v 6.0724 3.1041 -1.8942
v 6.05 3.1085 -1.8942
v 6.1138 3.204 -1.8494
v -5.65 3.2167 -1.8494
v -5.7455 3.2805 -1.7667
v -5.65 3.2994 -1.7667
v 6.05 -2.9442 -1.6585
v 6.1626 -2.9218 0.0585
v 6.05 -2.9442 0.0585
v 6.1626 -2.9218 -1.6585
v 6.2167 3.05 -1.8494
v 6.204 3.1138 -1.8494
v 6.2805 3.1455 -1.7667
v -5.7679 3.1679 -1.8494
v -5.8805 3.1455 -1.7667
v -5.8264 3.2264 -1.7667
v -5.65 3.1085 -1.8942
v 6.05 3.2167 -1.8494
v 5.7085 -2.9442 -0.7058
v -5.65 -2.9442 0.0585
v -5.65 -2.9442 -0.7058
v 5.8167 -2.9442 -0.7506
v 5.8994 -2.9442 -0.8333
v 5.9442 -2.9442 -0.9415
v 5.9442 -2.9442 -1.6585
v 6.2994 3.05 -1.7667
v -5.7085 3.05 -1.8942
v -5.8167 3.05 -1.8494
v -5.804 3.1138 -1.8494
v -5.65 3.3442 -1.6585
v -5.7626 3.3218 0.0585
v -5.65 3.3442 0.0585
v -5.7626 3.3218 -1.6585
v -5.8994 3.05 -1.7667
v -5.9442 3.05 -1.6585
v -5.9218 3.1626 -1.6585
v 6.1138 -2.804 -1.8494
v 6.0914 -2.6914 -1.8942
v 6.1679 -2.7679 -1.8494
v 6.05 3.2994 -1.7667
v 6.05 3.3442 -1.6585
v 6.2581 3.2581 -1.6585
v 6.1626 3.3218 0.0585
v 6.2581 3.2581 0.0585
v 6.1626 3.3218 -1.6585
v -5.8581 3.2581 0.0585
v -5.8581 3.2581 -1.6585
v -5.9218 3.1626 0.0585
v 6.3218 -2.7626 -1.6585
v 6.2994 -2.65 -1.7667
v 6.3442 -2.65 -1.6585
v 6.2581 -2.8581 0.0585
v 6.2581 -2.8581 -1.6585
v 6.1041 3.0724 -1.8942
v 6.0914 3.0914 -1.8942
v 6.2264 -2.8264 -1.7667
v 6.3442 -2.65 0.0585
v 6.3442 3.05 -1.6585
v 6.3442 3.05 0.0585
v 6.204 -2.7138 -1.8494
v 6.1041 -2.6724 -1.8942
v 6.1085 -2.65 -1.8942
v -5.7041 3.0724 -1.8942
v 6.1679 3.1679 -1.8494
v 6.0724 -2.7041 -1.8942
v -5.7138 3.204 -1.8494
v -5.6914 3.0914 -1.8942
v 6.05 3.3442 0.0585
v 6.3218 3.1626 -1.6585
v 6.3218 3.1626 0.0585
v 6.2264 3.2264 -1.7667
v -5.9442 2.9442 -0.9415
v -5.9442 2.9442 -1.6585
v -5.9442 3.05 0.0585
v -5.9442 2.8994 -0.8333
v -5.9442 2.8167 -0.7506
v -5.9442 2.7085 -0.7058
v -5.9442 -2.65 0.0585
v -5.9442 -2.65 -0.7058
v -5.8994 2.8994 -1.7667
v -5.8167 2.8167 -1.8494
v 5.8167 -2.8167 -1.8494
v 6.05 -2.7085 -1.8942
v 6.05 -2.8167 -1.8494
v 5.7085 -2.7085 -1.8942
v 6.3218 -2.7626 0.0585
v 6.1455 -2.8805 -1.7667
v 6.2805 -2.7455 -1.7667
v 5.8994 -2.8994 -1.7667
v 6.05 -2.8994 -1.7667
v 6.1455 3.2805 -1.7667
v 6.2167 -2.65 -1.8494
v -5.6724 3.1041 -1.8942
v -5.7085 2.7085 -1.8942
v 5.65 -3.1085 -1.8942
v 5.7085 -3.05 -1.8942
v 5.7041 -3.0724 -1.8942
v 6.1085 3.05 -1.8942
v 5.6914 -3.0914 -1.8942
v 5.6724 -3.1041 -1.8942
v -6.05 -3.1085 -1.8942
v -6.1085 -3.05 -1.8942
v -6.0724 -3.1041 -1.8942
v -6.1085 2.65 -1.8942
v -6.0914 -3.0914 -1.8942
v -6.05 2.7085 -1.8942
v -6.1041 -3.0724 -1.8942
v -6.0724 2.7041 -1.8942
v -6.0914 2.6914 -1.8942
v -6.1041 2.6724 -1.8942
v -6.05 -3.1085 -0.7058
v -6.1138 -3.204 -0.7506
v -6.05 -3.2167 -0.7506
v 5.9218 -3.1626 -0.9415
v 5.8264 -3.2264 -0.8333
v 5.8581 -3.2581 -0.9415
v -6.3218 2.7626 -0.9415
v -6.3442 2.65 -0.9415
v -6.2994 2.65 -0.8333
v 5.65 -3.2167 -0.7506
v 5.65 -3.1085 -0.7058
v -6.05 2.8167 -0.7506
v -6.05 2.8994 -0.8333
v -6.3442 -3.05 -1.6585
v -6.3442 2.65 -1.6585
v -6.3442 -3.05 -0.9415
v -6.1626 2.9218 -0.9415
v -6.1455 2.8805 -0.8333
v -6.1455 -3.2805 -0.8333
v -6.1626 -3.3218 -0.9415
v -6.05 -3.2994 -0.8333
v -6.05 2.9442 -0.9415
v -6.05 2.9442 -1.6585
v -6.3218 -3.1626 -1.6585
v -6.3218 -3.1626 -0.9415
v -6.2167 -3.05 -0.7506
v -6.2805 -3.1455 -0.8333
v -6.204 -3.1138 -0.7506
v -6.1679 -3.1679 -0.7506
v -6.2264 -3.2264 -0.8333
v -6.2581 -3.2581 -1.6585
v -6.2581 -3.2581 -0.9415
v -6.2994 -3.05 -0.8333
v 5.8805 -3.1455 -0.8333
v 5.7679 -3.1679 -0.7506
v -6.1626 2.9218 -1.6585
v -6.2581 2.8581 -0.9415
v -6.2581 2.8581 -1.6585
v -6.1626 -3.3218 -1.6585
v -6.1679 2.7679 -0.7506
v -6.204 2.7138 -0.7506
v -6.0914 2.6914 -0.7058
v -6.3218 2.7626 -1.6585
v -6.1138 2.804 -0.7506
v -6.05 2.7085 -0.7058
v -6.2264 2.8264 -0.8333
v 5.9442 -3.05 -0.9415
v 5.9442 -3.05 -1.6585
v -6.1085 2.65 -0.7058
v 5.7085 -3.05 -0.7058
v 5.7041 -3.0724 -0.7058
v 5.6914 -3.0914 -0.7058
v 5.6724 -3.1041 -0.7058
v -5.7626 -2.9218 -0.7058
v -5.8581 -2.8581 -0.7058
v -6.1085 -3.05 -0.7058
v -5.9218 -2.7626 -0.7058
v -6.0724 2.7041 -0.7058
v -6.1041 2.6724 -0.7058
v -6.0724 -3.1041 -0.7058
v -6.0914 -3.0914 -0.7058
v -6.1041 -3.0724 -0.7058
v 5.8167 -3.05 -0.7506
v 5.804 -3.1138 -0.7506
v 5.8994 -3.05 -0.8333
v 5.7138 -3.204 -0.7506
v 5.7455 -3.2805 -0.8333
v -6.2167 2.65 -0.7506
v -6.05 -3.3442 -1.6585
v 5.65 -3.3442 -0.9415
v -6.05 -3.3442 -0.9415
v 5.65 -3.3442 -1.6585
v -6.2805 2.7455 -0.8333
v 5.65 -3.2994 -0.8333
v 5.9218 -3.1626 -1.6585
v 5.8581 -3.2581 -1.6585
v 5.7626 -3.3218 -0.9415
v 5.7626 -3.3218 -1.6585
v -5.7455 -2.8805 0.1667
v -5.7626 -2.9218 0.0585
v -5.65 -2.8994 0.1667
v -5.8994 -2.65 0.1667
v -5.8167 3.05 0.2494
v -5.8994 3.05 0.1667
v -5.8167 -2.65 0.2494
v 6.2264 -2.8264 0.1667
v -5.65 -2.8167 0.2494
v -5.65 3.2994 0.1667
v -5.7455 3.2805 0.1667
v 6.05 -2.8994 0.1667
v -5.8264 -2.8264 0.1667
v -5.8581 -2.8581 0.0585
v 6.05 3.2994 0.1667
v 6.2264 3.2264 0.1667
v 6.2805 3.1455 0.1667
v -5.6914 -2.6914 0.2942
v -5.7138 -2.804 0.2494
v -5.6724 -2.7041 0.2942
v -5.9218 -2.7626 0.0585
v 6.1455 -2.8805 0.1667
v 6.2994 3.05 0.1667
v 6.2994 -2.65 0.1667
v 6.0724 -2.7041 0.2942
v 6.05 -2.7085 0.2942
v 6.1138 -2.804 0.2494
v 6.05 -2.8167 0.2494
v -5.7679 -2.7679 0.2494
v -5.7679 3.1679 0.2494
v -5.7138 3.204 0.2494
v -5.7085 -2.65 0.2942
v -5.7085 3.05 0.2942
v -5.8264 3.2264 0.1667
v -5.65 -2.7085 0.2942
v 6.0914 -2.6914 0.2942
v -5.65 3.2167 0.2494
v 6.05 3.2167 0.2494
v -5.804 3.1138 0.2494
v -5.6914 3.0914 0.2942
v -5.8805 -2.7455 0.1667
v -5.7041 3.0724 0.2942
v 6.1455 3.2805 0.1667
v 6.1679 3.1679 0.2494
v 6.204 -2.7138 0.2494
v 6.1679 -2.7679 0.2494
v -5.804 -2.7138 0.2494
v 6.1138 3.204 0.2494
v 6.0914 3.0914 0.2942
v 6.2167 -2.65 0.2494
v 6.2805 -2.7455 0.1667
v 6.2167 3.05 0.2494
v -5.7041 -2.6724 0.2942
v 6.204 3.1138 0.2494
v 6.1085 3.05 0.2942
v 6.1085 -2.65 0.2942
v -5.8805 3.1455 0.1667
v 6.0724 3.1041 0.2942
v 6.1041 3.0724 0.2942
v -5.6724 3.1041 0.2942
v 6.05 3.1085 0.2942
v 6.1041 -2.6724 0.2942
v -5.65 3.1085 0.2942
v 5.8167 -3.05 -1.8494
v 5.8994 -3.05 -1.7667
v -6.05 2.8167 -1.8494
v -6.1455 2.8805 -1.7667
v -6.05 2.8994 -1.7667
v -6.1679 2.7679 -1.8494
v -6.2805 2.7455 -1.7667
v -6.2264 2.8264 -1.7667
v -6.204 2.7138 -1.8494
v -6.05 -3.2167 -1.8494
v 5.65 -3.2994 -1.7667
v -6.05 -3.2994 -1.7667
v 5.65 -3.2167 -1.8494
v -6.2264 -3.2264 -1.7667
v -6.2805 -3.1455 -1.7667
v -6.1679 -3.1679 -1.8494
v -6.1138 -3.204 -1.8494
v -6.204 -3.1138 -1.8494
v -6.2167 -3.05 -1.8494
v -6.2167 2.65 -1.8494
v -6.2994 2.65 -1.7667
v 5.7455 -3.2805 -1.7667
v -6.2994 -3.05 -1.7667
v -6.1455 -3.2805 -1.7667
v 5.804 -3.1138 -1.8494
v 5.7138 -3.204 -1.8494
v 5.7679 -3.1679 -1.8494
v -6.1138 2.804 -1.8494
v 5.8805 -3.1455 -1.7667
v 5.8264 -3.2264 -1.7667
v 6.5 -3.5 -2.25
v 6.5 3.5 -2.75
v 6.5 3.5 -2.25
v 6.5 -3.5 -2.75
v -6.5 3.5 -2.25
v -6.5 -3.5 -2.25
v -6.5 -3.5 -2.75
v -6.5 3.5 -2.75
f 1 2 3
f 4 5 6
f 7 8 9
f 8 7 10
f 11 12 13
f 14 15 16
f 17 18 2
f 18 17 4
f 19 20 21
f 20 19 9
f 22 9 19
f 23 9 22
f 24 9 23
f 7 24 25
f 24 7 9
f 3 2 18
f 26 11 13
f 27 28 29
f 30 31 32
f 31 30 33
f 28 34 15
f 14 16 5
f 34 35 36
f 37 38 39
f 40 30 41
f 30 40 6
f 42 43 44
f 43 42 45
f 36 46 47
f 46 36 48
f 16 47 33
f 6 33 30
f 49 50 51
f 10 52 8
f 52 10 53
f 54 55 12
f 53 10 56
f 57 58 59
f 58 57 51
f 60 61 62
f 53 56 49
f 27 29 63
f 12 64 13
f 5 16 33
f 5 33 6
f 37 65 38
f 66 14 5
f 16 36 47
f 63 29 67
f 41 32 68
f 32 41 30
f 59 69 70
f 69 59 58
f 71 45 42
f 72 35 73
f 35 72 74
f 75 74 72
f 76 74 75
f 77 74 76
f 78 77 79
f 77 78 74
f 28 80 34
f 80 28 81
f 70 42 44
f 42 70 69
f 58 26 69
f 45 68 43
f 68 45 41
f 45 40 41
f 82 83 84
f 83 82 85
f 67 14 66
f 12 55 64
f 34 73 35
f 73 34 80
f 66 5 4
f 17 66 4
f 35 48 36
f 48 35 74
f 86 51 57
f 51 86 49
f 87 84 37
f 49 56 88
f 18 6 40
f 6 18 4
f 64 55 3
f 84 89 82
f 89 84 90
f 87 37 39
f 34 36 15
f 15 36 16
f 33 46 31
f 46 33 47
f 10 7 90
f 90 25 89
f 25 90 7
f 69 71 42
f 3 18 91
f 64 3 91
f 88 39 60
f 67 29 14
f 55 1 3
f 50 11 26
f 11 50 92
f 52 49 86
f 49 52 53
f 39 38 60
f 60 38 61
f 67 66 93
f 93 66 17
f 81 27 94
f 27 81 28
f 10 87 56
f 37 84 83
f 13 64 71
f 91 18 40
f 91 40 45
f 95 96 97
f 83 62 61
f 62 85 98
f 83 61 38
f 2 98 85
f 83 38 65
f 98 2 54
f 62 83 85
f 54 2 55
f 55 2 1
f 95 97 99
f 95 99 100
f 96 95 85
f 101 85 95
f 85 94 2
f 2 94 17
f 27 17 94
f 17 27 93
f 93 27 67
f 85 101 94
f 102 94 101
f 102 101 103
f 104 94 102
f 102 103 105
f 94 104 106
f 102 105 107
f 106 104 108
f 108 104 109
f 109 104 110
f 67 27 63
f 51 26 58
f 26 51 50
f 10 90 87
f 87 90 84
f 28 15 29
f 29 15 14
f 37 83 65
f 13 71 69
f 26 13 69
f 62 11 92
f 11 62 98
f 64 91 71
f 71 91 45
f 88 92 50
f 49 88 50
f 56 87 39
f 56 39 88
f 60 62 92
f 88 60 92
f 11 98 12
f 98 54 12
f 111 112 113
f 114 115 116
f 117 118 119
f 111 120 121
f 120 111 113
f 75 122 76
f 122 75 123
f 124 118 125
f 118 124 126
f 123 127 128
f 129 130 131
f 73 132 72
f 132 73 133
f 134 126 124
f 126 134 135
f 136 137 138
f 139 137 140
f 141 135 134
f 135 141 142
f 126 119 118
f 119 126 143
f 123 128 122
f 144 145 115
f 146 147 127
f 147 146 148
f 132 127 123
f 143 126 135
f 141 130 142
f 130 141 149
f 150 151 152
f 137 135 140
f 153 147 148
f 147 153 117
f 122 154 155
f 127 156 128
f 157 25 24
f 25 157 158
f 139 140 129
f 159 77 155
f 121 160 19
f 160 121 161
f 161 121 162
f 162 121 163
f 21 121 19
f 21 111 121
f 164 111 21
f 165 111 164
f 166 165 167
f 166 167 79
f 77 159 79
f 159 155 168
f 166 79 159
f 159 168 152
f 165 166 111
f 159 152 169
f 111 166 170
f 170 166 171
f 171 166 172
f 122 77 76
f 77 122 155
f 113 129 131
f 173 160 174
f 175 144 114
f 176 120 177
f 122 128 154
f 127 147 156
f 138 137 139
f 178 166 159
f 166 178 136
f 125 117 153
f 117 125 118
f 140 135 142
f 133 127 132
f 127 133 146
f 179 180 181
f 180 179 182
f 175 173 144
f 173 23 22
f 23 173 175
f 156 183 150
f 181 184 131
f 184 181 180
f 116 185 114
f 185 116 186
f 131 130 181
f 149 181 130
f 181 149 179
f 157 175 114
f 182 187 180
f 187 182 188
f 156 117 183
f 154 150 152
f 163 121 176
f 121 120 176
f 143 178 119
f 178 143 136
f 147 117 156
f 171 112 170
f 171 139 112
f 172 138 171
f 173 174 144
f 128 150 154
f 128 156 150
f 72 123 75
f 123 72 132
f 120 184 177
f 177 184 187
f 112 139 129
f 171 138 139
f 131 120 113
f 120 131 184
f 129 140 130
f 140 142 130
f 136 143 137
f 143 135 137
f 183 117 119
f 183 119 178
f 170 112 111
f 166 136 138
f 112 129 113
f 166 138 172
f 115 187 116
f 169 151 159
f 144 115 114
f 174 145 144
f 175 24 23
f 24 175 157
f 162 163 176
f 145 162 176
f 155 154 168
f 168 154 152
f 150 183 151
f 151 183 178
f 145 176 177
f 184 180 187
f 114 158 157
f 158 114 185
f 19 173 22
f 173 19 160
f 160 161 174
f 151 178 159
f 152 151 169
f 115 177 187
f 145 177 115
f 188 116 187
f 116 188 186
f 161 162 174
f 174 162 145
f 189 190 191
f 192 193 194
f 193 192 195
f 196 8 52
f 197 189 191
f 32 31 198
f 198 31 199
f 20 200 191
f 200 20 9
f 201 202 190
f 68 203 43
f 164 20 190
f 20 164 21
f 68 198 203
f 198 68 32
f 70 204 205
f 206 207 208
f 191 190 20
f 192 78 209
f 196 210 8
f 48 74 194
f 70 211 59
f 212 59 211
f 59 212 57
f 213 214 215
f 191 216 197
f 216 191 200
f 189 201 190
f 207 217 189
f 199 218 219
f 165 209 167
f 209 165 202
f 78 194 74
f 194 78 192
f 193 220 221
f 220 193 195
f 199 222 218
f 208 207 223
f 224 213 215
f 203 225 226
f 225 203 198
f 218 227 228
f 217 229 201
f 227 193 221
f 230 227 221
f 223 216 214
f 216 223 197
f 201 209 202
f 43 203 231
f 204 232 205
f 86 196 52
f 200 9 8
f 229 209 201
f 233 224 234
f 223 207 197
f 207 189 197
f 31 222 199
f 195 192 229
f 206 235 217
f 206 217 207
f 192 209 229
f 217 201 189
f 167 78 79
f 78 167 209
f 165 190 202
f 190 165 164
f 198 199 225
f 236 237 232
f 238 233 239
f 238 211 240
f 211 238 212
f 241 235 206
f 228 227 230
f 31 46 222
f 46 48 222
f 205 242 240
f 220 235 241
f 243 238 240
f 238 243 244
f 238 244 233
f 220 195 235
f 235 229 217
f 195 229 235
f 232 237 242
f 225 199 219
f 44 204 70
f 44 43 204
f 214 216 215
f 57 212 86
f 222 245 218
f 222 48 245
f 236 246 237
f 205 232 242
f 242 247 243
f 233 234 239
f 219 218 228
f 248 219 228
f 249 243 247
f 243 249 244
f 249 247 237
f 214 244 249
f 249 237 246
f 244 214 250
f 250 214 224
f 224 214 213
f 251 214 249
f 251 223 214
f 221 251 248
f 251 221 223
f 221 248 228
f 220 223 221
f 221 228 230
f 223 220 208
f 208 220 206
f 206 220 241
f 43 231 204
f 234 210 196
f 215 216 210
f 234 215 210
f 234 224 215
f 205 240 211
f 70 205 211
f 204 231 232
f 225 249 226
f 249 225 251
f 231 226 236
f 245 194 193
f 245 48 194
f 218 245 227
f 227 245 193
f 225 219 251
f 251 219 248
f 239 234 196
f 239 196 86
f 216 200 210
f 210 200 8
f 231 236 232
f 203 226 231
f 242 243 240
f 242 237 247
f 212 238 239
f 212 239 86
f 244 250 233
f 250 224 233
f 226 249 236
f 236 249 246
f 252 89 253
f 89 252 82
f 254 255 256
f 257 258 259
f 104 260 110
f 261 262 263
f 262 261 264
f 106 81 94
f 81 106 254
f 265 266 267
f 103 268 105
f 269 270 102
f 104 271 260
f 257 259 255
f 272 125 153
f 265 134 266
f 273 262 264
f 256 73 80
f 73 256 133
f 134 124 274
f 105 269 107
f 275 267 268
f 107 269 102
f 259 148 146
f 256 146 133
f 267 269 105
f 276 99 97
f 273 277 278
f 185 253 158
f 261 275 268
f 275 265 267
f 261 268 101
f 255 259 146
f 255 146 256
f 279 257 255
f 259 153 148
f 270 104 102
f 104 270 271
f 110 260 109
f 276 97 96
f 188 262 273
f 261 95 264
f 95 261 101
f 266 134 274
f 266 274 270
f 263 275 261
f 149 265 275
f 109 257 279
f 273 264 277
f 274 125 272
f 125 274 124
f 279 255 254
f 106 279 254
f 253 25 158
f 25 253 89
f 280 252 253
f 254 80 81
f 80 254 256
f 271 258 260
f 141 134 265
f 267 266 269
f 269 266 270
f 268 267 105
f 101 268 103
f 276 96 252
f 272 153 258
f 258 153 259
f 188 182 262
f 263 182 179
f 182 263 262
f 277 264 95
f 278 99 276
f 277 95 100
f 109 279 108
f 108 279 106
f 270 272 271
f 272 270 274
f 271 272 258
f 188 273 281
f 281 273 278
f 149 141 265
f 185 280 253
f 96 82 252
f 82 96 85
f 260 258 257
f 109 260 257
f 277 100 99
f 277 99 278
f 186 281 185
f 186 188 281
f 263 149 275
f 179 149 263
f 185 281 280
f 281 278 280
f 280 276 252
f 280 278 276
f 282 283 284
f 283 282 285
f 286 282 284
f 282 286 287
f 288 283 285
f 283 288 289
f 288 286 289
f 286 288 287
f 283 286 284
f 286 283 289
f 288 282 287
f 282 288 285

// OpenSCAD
brick_w = 12;
brick_d = 6;
brick_h = 4;
layer_thicknesses = [0.4, 0.5, 1.0, 0.5, 0.5, 0.4];
layer_colors = [
    [0.45,0.43,0.40,0.4],
    [0.38,0.36,0.33,0.6],
    [0.20,0.20,0.22,1.0],
    [0.32,0.30,0.28,0.8],
    [0.32,0.30,0.28,0.8],
    [0.45,0.43,0.40,0.6]
];
bevel = 0.3;
interlock_offset = 0.2;

module interlocked_brick() {
    zpos = -brick_h/2;
    for(i=[0:len(layer_thicknesses)-1]) {
        t = layer_thicknesses[i];
        col = layer_colors[i];
        x_off = (i % 2 == 0) ? interlock_offset : -interlock_offset;
        y_off = (i % 2 == 0) ? interlock_offset : -interlock_offset;
        color(col)
        translate([x_off, y_off, zpos + t/2])
        minkowski() {
            cube([brick_w - bevel, brick_d - bevel, t], center=true);
            sphere(r=bevel, $fn=16);
        }
        for(s=[-t/2 + 0.1 : 0.2 : t/2 - 0.1]) {
            color([0,0,0,0.05])
            translate([0,0,zpos+s])
                cube([brick_w*0.95, brick_d*0.95, 0.05], center=true);
        }
        zpos = zpos + t;
    }
}

module base_platform() {
    base_thick = 0.5;
    color([0.1,0.1,0.1])
        translate([0,0,-brick_h/2 - base_thick])
            cube([brick_w+1, brick_d+1, base_thick], center=true);
}

union() {
    base_platform();
    interlocked_brick();
}
